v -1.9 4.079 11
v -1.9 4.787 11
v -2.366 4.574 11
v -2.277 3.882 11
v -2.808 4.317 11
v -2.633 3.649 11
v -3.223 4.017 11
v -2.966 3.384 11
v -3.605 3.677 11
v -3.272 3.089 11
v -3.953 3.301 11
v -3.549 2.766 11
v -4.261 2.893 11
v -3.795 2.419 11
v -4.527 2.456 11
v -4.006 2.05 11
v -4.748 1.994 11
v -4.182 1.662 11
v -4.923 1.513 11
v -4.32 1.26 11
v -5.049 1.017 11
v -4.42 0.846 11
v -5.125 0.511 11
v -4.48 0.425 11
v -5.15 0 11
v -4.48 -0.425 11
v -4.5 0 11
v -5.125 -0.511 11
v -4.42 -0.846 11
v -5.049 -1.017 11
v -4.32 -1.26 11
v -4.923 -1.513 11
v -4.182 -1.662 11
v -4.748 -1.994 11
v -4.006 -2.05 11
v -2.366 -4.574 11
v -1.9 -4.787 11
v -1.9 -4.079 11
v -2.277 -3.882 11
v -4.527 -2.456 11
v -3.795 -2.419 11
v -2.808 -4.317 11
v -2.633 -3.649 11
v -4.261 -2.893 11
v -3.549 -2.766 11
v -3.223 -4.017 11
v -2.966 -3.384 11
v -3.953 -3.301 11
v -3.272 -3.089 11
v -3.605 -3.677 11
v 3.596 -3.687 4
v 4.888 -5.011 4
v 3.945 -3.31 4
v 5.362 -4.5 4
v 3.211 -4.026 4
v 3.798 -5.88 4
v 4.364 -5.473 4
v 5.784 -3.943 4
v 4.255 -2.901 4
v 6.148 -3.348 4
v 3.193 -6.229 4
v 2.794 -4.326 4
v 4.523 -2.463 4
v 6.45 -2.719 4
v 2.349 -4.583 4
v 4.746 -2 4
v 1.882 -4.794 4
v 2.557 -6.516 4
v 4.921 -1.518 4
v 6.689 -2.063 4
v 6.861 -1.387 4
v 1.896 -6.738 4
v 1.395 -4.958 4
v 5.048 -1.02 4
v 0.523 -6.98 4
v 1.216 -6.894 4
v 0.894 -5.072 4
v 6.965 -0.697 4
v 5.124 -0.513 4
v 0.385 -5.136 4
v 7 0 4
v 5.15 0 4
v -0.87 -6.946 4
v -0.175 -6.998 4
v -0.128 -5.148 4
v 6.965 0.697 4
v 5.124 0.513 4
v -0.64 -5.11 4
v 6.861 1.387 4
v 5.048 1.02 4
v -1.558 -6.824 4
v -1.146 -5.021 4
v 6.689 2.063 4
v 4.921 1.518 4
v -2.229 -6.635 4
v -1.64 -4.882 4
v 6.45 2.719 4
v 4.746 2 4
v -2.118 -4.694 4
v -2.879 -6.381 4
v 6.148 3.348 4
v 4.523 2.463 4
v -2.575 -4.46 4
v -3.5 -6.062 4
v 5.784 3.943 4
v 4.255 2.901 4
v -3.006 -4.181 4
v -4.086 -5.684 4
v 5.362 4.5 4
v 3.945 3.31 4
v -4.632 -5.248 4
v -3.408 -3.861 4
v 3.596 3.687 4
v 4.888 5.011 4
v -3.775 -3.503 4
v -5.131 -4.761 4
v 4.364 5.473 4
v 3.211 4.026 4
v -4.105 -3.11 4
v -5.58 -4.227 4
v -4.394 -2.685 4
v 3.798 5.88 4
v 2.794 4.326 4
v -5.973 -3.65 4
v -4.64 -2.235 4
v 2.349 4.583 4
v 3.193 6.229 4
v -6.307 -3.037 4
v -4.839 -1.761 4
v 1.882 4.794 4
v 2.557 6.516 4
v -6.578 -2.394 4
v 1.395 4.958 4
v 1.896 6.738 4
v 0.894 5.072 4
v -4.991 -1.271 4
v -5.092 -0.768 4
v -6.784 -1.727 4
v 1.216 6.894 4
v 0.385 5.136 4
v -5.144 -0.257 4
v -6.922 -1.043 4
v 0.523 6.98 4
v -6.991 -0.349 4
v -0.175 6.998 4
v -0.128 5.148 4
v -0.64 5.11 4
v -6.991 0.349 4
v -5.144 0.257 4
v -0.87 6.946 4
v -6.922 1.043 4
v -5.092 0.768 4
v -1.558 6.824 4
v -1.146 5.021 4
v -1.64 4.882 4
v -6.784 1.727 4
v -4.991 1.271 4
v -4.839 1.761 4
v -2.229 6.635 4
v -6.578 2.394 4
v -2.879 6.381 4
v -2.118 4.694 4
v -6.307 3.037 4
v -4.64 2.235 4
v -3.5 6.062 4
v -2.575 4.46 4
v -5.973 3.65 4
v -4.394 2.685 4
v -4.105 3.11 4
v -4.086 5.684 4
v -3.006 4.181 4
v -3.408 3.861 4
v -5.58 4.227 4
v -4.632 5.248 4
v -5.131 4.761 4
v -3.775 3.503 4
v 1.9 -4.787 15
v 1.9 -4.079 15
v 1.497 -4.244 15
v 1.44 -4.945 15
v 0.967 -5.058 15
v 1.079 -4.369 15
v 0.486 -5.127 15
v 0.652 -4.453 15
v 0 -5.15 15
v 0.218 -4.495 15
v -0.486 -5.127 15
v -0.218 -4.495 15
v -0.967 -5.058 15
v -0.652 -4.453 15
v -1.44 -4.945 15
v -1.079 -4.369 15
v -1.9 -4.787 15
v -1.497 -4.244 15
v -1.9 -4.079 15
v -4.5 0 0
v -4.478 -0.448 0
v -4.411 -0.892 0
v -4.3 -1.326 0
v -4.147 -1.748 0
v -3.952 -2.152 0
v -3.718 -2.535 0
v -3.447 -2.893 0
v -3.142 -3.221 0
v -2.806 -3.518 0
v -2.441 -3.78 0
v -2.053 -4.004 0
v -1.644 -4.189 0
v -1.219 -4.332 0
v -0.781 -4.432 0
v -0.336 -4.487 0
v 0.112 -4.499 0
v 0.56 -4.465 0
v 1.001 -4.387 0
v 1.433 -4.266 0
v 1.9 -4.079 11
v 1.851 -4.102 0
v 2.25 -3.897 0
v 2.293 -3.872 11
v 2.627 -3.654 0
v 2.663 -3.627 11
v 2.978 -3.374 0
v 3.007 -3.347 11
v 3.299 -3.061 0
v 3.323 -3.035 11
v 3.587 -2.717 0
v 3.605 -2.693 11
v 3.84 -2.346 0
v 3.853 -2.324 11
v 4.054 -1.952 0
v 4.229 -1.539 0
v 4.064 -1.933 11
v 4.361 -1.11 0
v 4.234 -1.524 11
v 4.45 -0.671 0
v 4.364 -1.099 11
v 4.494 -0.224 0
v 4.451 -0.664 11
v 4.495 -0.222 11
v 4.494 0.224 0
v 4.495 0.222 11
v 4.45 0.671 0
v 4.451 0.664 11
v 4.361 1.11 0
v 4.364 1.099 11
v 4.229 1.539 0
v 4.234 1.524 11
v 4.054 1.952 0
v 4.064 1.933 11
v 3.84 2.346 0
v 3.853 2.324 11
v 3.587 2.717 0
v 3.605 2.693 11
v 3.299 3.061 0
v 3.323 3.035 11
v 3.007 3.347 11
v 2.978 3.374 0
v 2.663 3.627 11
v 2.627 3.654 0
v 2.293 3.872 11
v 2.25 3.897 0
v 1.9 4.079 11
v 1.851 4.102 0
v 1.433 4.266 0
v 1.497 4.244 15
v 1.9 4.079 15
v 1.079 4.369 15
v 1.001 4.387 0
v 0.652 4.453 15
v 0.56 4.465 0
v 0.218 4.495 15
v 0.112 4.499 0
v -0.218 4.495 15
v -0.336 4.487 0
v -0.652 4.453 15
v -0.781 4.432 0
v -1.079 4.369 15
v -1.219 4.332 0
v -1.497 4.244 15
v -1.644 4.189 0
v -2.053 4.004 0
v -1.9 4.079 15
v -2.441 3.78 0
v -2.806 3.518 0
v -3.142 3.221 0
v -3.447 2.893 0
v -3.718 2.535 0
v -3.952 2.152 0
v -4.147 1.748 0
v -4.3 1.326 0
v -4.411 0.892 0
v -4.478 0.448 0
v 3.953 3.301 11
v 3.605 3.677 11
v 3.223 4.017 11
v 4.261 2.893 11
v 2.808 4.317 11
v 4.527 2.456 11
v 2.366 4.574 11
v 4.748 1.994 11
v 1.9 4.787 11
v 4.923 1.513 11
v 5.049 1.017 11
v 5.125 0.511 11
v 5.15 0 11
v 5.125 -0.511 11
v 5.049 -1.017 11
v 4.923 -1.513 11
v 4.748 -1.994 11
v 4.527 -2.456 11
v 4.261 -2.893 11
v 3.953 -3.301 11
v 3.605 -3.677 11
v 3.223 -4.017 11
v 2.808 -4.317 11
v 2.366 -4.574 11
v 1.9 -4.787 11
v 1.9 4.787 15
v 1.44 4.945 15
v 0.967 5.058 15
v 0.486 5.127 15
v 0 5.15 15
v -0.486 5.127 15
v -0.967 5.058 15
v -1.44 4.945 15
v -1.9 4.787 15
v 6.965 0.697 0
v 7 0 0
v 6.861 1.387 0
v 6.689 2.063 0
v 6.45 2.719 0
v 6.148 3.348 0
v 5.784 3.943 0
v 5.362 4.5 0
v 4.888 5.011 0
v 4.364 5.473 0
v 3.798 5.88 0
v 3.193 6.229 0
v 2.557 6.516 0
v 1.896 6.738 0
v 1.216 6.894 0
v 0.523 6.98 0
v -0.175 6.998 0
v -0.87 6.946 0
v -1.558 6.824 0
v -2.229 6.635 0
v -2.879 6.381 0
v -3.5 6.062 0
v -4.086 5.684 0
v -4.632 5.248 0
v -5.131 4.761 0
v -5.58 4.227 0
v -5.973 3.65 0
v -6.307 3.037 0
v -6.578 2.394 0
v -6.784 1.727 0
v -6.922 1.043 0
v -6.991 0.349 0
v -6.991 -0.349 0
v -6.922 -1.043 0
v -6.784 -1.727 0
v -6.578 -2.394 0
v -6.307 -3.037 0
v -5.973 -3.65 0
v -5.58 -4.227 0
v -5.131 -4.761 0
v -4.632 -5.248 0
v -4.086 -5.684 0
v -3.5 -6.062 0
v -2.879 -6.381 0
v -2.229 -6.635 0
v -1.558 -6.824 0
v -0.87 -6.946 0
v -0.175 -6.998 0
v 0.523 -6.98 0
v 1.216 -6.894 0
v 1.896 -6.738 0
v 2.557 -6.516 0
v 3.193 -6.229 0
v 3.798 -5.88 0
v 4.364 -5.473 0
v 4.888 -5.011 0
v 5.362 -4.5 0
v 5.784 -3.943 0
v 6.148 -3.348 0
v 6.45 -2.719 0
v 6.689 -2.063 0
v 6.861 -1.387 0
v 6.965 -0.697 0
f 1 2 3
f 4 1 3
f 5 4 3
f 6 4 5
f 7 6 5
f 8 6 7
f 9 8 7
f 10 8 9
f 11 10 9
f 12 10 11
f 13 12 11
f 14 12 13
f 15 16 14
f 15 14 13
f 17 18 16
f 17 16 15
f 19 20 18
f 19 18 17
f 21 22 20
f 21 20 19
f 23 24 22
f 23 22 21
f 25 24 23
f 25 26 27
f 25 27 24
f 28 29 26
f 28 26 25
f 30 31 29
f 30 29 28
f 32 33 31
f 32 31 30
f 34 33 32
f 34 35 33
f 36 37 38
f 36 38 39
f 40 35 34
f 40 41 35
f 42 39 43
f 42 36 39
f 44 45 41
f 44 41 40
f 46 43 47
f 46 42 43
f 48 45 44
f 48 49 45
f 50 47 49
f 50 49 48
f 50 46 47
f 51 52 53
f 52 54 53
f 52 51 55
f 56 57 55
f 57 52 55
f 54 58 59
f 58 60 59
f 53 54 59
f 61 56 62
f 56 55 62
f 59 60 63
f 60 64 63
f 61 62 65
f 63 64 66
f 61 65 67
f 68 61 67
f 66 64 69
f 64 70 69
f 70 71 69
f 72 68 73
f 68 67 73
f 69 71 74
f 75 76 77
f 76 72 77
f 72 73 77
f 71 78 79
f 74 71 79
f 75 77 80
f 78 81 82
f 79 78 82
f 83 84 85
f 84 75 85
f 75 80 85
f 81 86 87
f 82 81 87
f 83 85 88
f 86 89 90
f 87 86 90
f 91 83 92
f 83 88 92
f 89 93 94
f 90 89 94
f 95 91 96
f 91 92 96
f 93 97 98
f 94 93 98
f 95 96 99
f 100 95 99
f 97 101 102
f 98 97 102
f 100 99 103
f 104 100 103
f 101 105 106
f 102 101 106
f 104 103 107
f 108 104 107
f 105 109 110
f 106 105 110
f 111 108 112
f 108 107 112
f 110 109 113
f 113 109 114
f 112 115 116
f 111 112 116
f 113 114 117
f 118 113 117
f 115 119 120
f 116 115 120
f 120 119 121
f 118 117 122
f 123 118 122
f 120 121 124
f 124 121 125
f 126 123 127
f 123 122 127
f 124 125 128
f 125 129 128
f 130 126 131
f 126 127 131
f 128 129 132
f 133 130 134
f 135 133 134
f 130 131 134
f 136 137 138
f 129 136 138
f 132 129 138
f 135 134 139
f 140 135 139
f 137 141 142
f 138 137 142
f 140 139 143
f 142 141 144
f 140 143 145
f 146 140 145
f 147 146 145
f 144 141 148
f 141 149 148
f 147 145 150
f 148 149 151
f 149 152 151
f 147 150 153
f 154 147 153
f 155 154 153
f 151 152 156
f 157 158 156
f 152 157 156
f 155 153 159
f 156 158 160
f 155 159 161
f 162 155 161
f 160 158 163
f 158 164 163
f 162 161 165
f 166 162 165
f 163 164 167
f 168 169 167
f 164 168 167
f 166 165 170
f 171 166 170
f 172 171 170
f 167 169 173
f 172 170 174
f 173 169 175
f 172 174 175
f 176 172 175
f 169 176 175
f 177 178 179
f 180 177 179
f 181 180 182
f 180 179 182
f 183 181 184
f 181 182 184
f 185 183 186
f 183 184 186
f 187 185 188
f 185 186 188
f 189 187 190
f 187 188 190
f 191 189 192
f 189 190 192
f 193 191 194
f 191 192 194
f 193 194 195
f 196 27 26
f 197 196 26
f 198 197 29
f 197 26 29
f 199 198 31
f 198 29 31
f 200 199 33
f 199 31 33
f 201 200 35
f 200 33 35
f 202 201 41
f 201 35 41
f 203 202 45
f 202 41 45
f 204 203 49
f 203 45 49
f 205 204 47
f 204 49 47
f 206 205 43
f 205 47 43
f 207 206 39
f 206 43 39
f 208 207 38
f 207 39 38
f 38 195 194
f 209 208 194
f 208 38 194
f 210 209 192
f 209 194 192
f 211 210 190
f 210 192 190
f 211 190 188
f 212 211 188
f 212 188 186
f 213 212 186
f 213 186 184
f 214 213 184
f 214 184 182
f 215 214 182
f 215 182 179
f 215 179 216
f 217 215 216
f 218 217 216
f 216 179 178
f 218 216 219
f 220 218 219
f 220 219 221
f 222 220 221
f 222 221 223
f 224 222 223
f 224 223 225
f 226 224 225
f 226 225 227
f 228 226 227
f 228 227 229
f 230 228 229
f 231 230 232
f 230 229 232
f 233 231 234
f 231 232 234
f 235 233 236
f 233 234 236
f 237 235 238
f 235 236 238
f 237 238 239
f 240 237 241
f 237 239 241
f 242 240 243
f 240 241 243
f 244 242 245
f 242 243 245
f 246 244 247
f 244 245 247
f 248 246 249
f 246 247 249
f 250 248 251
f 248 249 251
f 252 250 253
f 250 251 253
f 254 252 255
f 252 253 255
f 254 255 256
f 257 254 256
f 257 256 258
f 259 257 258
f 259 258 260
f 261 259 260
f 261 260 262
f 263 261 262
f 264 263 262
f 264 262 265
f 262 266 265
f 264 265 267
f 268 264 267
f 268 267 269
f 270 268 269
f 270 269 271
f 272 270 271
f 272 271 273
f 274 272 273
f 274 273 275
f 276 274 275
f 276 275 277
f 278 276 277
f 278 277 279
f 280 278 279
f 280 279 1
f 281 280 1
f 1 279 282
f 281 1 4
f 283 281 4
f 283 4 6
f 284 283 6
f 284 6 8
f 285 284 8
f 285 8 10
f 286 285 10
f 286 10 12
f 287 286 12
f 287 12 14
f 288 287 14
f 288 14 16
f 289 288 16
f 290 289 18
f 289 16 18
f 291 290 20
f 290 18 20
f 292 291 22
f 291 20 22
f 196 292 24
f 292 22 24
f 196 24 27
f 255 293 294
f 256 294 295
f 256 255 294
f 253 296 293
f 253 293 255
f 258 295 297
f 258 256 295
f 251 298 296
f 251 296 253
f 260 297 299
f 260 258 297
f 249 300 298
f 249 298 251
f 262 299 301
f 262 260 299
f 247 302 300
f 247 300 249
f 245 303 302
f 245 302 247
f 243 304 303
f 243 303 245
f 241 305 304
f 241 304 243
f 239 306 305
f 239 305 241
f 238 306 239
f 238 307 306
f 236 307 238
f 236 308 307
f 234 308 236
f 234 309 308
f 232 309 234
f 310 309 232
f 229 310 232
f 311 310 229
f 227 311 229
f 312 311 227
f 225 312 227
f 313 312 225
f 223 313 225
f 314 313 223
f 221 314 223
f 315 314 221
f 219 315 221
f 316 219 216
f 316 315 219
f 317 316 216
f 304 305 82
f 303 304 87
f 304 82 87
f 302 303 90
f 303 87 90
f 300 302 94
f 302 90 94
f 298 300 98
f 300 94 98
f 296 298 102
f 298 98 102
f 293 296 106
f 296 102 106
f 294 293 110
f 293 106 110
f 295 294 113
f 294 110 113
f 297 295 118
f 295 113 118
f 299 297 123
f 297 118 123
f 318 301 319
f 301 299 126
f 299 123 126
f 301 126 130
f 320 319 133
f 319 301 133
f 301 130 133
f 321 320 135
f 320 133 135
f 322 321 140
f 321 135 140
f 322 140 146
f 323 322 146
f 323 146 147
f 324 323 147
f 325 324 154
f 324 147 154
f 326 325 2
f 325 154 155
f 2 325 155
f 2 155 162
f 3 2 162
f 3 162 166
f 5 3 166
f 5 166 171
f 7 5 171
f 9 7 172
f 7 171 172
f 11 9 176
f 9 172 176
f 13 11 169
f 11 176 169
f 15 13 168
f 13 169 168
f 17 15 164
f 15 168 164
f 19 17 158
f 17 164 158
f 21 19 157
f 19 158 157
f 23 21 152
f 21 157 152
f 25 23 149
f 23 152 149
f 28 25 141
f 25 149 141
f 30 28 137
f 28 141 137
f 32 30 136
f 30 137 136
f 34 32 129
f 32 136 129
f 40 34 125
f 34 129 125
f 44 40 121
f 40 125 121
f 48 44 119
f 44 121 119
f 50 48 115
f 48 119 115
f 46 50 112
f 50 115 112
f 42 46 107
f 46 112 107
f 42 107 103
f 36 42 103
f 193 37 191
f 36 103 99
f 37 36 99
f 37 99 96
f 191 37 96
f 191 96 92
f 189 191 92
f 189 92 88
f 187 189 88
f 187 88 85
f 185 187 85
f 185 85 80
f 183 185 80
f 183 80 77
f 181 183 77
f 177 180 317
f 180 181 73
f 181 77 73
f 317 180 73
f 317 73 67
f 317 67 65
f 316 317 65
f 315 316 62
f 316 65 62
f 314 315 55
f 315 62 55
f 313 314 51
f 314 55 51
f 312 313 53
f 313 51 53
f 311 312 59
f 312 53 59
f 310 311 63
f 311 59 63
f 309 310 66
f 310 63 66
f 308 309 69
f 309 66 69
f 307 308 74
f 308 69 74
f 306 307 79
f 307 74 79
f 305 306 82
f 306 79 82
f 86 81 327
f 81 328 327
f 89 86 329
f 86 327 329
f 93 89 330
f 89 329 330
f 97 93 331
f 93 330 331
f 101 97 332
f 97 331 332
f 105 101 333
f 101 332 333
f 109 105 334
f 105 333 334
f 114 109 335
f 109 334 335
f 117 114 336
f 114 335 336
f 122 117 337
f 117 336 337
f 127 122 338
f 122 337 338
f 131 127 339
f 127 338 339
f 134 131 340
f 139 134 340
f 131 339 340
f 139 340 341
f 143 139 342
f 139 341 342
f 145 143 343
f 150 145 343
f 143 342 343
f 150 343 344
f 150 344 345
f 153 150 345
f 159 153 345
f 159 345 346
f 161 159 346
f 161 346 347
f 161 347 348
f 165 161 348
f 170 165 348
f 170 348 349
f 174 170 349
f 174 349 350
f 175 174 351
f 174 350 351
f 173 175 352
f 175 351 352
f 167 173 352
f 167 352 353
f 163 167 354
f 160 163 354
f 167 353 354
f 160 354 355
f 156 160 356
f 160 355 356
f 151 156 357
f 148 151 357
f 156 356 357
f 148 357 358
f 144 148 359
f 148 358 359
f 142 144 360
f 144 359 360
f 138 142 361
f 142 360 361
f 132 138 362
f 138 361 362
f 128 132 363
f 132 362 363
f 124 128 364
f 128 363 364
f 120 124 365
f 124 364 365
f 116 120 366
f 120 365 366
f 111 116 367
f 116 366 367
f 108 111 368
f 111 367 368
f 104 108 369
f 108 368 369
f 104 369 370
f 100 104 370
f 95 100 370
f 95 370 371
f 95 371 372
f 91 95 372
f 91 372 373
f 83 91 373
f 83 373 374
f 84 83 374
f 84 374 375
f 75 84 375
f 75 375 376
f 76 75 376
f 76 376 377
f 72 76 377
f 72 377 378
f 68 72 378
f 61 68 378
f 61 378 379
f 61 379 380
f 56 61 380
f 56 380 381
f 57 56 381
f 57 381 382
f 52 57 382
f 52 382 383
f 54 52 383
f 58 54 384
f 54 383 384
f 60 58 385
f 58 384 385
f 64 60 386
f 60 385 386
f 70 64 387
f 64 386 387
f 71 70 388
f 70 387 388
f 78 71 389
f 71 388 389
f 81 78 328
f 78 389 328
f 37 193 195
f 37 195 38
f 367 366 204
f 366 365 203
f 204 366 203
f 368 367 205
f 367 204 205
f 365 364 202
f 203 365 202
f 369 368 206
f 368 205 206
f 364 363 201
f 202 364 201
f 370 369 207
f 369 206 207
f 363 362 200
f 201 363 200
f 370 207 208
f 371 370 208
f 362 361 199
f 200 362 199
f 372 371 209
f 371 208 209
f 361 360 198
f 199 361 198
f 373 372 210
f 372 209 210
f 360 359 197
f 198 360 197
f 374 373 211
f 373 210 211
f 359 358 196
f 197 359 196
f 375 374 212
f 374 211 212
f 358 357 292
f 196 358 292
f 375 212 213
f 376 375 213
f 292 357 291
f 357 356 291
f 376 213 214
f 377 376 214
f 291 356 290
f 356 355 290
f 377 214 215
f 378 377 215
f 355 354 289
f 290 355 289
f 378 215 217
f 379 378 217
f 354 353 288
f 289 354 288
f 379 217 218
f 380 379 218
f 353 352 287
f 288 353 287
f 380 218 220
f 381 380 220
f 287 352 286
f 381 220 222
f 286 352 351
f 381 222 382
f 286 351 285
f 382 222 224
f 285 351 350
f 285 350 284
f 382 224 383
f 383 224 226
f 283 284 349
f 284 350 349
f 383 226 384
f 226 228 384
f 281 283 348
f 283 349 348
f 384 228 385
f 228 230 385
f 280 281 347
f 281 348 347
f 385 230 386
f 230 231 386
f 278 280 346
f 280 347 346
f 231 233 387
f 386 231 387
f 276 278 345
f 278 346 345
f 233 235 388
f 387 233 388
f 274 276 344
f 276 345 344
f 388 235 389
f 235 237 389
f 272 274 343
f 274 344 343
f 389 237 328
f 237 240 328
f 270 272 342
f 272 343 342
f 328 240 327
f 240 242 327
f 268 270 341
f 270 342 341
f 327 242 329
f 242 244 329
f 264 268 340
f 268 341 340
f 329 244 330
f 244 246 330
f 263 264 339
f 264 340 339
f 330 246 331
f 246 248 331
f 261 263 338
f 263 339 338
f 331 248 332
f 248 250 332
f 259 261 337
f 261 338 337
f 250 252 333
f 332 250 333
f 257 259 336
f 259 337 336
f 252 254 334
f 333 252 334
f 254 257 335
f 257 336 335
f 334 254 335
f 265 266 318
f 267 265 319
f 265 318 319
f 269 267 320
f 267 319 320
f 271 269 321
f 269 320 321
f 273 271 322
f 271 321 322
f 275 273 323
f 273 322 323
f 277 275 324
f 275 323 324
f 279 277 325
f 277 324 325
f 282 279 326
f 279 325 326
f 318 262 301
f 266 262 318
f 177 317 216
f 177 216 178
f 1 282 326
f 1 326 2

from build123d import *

# Parameters (mm, degrees)
SKETCH001_R  = 4.5
HOLE_DEPTH   = 25
POCKET_DEPTH = 10


with BuildPart() as part:
    # Sketch → Revolution (revolve)
    with BuildSketch(Plane.XZ):
        Polygon((0, 0), (0, 15), (5.15, 15), (5.15, 4), (7, 4), (7, 0), align=None)
    revolve(axis=Axis((0, 0, 0), (0, 0, 1)))

    # Sketch001 (on Face1 of Revolution) → Hole (cut)
    with BuildSketch(Plane(origin=(0, 0, 15), x_dir=(-1, 0, 0), z_dir=(0, 0, 1))):
        Circle(SKETCH001_R)
    extrude(amount=-HOLE_DEPTH, mode=Mode.SUBTRACT)

    # Sketch002 → Pocket (cut, symmetric)
    with BuildSketch(Plane.XZ):
        Polygon((-1.9, 15), (-1.9, 11), (-5.15, 11), (-5.15, 15), (-5.15, 18.504541), (5.249575, 18.504541), (5.249575, 15), (5.249575, 11), (1.9, 11), (1.9, 15), align=None)
    extrude(amount=POCKET_DEPTH, both=True, mode=Mode.SUBTRACT)


solid = part.part
